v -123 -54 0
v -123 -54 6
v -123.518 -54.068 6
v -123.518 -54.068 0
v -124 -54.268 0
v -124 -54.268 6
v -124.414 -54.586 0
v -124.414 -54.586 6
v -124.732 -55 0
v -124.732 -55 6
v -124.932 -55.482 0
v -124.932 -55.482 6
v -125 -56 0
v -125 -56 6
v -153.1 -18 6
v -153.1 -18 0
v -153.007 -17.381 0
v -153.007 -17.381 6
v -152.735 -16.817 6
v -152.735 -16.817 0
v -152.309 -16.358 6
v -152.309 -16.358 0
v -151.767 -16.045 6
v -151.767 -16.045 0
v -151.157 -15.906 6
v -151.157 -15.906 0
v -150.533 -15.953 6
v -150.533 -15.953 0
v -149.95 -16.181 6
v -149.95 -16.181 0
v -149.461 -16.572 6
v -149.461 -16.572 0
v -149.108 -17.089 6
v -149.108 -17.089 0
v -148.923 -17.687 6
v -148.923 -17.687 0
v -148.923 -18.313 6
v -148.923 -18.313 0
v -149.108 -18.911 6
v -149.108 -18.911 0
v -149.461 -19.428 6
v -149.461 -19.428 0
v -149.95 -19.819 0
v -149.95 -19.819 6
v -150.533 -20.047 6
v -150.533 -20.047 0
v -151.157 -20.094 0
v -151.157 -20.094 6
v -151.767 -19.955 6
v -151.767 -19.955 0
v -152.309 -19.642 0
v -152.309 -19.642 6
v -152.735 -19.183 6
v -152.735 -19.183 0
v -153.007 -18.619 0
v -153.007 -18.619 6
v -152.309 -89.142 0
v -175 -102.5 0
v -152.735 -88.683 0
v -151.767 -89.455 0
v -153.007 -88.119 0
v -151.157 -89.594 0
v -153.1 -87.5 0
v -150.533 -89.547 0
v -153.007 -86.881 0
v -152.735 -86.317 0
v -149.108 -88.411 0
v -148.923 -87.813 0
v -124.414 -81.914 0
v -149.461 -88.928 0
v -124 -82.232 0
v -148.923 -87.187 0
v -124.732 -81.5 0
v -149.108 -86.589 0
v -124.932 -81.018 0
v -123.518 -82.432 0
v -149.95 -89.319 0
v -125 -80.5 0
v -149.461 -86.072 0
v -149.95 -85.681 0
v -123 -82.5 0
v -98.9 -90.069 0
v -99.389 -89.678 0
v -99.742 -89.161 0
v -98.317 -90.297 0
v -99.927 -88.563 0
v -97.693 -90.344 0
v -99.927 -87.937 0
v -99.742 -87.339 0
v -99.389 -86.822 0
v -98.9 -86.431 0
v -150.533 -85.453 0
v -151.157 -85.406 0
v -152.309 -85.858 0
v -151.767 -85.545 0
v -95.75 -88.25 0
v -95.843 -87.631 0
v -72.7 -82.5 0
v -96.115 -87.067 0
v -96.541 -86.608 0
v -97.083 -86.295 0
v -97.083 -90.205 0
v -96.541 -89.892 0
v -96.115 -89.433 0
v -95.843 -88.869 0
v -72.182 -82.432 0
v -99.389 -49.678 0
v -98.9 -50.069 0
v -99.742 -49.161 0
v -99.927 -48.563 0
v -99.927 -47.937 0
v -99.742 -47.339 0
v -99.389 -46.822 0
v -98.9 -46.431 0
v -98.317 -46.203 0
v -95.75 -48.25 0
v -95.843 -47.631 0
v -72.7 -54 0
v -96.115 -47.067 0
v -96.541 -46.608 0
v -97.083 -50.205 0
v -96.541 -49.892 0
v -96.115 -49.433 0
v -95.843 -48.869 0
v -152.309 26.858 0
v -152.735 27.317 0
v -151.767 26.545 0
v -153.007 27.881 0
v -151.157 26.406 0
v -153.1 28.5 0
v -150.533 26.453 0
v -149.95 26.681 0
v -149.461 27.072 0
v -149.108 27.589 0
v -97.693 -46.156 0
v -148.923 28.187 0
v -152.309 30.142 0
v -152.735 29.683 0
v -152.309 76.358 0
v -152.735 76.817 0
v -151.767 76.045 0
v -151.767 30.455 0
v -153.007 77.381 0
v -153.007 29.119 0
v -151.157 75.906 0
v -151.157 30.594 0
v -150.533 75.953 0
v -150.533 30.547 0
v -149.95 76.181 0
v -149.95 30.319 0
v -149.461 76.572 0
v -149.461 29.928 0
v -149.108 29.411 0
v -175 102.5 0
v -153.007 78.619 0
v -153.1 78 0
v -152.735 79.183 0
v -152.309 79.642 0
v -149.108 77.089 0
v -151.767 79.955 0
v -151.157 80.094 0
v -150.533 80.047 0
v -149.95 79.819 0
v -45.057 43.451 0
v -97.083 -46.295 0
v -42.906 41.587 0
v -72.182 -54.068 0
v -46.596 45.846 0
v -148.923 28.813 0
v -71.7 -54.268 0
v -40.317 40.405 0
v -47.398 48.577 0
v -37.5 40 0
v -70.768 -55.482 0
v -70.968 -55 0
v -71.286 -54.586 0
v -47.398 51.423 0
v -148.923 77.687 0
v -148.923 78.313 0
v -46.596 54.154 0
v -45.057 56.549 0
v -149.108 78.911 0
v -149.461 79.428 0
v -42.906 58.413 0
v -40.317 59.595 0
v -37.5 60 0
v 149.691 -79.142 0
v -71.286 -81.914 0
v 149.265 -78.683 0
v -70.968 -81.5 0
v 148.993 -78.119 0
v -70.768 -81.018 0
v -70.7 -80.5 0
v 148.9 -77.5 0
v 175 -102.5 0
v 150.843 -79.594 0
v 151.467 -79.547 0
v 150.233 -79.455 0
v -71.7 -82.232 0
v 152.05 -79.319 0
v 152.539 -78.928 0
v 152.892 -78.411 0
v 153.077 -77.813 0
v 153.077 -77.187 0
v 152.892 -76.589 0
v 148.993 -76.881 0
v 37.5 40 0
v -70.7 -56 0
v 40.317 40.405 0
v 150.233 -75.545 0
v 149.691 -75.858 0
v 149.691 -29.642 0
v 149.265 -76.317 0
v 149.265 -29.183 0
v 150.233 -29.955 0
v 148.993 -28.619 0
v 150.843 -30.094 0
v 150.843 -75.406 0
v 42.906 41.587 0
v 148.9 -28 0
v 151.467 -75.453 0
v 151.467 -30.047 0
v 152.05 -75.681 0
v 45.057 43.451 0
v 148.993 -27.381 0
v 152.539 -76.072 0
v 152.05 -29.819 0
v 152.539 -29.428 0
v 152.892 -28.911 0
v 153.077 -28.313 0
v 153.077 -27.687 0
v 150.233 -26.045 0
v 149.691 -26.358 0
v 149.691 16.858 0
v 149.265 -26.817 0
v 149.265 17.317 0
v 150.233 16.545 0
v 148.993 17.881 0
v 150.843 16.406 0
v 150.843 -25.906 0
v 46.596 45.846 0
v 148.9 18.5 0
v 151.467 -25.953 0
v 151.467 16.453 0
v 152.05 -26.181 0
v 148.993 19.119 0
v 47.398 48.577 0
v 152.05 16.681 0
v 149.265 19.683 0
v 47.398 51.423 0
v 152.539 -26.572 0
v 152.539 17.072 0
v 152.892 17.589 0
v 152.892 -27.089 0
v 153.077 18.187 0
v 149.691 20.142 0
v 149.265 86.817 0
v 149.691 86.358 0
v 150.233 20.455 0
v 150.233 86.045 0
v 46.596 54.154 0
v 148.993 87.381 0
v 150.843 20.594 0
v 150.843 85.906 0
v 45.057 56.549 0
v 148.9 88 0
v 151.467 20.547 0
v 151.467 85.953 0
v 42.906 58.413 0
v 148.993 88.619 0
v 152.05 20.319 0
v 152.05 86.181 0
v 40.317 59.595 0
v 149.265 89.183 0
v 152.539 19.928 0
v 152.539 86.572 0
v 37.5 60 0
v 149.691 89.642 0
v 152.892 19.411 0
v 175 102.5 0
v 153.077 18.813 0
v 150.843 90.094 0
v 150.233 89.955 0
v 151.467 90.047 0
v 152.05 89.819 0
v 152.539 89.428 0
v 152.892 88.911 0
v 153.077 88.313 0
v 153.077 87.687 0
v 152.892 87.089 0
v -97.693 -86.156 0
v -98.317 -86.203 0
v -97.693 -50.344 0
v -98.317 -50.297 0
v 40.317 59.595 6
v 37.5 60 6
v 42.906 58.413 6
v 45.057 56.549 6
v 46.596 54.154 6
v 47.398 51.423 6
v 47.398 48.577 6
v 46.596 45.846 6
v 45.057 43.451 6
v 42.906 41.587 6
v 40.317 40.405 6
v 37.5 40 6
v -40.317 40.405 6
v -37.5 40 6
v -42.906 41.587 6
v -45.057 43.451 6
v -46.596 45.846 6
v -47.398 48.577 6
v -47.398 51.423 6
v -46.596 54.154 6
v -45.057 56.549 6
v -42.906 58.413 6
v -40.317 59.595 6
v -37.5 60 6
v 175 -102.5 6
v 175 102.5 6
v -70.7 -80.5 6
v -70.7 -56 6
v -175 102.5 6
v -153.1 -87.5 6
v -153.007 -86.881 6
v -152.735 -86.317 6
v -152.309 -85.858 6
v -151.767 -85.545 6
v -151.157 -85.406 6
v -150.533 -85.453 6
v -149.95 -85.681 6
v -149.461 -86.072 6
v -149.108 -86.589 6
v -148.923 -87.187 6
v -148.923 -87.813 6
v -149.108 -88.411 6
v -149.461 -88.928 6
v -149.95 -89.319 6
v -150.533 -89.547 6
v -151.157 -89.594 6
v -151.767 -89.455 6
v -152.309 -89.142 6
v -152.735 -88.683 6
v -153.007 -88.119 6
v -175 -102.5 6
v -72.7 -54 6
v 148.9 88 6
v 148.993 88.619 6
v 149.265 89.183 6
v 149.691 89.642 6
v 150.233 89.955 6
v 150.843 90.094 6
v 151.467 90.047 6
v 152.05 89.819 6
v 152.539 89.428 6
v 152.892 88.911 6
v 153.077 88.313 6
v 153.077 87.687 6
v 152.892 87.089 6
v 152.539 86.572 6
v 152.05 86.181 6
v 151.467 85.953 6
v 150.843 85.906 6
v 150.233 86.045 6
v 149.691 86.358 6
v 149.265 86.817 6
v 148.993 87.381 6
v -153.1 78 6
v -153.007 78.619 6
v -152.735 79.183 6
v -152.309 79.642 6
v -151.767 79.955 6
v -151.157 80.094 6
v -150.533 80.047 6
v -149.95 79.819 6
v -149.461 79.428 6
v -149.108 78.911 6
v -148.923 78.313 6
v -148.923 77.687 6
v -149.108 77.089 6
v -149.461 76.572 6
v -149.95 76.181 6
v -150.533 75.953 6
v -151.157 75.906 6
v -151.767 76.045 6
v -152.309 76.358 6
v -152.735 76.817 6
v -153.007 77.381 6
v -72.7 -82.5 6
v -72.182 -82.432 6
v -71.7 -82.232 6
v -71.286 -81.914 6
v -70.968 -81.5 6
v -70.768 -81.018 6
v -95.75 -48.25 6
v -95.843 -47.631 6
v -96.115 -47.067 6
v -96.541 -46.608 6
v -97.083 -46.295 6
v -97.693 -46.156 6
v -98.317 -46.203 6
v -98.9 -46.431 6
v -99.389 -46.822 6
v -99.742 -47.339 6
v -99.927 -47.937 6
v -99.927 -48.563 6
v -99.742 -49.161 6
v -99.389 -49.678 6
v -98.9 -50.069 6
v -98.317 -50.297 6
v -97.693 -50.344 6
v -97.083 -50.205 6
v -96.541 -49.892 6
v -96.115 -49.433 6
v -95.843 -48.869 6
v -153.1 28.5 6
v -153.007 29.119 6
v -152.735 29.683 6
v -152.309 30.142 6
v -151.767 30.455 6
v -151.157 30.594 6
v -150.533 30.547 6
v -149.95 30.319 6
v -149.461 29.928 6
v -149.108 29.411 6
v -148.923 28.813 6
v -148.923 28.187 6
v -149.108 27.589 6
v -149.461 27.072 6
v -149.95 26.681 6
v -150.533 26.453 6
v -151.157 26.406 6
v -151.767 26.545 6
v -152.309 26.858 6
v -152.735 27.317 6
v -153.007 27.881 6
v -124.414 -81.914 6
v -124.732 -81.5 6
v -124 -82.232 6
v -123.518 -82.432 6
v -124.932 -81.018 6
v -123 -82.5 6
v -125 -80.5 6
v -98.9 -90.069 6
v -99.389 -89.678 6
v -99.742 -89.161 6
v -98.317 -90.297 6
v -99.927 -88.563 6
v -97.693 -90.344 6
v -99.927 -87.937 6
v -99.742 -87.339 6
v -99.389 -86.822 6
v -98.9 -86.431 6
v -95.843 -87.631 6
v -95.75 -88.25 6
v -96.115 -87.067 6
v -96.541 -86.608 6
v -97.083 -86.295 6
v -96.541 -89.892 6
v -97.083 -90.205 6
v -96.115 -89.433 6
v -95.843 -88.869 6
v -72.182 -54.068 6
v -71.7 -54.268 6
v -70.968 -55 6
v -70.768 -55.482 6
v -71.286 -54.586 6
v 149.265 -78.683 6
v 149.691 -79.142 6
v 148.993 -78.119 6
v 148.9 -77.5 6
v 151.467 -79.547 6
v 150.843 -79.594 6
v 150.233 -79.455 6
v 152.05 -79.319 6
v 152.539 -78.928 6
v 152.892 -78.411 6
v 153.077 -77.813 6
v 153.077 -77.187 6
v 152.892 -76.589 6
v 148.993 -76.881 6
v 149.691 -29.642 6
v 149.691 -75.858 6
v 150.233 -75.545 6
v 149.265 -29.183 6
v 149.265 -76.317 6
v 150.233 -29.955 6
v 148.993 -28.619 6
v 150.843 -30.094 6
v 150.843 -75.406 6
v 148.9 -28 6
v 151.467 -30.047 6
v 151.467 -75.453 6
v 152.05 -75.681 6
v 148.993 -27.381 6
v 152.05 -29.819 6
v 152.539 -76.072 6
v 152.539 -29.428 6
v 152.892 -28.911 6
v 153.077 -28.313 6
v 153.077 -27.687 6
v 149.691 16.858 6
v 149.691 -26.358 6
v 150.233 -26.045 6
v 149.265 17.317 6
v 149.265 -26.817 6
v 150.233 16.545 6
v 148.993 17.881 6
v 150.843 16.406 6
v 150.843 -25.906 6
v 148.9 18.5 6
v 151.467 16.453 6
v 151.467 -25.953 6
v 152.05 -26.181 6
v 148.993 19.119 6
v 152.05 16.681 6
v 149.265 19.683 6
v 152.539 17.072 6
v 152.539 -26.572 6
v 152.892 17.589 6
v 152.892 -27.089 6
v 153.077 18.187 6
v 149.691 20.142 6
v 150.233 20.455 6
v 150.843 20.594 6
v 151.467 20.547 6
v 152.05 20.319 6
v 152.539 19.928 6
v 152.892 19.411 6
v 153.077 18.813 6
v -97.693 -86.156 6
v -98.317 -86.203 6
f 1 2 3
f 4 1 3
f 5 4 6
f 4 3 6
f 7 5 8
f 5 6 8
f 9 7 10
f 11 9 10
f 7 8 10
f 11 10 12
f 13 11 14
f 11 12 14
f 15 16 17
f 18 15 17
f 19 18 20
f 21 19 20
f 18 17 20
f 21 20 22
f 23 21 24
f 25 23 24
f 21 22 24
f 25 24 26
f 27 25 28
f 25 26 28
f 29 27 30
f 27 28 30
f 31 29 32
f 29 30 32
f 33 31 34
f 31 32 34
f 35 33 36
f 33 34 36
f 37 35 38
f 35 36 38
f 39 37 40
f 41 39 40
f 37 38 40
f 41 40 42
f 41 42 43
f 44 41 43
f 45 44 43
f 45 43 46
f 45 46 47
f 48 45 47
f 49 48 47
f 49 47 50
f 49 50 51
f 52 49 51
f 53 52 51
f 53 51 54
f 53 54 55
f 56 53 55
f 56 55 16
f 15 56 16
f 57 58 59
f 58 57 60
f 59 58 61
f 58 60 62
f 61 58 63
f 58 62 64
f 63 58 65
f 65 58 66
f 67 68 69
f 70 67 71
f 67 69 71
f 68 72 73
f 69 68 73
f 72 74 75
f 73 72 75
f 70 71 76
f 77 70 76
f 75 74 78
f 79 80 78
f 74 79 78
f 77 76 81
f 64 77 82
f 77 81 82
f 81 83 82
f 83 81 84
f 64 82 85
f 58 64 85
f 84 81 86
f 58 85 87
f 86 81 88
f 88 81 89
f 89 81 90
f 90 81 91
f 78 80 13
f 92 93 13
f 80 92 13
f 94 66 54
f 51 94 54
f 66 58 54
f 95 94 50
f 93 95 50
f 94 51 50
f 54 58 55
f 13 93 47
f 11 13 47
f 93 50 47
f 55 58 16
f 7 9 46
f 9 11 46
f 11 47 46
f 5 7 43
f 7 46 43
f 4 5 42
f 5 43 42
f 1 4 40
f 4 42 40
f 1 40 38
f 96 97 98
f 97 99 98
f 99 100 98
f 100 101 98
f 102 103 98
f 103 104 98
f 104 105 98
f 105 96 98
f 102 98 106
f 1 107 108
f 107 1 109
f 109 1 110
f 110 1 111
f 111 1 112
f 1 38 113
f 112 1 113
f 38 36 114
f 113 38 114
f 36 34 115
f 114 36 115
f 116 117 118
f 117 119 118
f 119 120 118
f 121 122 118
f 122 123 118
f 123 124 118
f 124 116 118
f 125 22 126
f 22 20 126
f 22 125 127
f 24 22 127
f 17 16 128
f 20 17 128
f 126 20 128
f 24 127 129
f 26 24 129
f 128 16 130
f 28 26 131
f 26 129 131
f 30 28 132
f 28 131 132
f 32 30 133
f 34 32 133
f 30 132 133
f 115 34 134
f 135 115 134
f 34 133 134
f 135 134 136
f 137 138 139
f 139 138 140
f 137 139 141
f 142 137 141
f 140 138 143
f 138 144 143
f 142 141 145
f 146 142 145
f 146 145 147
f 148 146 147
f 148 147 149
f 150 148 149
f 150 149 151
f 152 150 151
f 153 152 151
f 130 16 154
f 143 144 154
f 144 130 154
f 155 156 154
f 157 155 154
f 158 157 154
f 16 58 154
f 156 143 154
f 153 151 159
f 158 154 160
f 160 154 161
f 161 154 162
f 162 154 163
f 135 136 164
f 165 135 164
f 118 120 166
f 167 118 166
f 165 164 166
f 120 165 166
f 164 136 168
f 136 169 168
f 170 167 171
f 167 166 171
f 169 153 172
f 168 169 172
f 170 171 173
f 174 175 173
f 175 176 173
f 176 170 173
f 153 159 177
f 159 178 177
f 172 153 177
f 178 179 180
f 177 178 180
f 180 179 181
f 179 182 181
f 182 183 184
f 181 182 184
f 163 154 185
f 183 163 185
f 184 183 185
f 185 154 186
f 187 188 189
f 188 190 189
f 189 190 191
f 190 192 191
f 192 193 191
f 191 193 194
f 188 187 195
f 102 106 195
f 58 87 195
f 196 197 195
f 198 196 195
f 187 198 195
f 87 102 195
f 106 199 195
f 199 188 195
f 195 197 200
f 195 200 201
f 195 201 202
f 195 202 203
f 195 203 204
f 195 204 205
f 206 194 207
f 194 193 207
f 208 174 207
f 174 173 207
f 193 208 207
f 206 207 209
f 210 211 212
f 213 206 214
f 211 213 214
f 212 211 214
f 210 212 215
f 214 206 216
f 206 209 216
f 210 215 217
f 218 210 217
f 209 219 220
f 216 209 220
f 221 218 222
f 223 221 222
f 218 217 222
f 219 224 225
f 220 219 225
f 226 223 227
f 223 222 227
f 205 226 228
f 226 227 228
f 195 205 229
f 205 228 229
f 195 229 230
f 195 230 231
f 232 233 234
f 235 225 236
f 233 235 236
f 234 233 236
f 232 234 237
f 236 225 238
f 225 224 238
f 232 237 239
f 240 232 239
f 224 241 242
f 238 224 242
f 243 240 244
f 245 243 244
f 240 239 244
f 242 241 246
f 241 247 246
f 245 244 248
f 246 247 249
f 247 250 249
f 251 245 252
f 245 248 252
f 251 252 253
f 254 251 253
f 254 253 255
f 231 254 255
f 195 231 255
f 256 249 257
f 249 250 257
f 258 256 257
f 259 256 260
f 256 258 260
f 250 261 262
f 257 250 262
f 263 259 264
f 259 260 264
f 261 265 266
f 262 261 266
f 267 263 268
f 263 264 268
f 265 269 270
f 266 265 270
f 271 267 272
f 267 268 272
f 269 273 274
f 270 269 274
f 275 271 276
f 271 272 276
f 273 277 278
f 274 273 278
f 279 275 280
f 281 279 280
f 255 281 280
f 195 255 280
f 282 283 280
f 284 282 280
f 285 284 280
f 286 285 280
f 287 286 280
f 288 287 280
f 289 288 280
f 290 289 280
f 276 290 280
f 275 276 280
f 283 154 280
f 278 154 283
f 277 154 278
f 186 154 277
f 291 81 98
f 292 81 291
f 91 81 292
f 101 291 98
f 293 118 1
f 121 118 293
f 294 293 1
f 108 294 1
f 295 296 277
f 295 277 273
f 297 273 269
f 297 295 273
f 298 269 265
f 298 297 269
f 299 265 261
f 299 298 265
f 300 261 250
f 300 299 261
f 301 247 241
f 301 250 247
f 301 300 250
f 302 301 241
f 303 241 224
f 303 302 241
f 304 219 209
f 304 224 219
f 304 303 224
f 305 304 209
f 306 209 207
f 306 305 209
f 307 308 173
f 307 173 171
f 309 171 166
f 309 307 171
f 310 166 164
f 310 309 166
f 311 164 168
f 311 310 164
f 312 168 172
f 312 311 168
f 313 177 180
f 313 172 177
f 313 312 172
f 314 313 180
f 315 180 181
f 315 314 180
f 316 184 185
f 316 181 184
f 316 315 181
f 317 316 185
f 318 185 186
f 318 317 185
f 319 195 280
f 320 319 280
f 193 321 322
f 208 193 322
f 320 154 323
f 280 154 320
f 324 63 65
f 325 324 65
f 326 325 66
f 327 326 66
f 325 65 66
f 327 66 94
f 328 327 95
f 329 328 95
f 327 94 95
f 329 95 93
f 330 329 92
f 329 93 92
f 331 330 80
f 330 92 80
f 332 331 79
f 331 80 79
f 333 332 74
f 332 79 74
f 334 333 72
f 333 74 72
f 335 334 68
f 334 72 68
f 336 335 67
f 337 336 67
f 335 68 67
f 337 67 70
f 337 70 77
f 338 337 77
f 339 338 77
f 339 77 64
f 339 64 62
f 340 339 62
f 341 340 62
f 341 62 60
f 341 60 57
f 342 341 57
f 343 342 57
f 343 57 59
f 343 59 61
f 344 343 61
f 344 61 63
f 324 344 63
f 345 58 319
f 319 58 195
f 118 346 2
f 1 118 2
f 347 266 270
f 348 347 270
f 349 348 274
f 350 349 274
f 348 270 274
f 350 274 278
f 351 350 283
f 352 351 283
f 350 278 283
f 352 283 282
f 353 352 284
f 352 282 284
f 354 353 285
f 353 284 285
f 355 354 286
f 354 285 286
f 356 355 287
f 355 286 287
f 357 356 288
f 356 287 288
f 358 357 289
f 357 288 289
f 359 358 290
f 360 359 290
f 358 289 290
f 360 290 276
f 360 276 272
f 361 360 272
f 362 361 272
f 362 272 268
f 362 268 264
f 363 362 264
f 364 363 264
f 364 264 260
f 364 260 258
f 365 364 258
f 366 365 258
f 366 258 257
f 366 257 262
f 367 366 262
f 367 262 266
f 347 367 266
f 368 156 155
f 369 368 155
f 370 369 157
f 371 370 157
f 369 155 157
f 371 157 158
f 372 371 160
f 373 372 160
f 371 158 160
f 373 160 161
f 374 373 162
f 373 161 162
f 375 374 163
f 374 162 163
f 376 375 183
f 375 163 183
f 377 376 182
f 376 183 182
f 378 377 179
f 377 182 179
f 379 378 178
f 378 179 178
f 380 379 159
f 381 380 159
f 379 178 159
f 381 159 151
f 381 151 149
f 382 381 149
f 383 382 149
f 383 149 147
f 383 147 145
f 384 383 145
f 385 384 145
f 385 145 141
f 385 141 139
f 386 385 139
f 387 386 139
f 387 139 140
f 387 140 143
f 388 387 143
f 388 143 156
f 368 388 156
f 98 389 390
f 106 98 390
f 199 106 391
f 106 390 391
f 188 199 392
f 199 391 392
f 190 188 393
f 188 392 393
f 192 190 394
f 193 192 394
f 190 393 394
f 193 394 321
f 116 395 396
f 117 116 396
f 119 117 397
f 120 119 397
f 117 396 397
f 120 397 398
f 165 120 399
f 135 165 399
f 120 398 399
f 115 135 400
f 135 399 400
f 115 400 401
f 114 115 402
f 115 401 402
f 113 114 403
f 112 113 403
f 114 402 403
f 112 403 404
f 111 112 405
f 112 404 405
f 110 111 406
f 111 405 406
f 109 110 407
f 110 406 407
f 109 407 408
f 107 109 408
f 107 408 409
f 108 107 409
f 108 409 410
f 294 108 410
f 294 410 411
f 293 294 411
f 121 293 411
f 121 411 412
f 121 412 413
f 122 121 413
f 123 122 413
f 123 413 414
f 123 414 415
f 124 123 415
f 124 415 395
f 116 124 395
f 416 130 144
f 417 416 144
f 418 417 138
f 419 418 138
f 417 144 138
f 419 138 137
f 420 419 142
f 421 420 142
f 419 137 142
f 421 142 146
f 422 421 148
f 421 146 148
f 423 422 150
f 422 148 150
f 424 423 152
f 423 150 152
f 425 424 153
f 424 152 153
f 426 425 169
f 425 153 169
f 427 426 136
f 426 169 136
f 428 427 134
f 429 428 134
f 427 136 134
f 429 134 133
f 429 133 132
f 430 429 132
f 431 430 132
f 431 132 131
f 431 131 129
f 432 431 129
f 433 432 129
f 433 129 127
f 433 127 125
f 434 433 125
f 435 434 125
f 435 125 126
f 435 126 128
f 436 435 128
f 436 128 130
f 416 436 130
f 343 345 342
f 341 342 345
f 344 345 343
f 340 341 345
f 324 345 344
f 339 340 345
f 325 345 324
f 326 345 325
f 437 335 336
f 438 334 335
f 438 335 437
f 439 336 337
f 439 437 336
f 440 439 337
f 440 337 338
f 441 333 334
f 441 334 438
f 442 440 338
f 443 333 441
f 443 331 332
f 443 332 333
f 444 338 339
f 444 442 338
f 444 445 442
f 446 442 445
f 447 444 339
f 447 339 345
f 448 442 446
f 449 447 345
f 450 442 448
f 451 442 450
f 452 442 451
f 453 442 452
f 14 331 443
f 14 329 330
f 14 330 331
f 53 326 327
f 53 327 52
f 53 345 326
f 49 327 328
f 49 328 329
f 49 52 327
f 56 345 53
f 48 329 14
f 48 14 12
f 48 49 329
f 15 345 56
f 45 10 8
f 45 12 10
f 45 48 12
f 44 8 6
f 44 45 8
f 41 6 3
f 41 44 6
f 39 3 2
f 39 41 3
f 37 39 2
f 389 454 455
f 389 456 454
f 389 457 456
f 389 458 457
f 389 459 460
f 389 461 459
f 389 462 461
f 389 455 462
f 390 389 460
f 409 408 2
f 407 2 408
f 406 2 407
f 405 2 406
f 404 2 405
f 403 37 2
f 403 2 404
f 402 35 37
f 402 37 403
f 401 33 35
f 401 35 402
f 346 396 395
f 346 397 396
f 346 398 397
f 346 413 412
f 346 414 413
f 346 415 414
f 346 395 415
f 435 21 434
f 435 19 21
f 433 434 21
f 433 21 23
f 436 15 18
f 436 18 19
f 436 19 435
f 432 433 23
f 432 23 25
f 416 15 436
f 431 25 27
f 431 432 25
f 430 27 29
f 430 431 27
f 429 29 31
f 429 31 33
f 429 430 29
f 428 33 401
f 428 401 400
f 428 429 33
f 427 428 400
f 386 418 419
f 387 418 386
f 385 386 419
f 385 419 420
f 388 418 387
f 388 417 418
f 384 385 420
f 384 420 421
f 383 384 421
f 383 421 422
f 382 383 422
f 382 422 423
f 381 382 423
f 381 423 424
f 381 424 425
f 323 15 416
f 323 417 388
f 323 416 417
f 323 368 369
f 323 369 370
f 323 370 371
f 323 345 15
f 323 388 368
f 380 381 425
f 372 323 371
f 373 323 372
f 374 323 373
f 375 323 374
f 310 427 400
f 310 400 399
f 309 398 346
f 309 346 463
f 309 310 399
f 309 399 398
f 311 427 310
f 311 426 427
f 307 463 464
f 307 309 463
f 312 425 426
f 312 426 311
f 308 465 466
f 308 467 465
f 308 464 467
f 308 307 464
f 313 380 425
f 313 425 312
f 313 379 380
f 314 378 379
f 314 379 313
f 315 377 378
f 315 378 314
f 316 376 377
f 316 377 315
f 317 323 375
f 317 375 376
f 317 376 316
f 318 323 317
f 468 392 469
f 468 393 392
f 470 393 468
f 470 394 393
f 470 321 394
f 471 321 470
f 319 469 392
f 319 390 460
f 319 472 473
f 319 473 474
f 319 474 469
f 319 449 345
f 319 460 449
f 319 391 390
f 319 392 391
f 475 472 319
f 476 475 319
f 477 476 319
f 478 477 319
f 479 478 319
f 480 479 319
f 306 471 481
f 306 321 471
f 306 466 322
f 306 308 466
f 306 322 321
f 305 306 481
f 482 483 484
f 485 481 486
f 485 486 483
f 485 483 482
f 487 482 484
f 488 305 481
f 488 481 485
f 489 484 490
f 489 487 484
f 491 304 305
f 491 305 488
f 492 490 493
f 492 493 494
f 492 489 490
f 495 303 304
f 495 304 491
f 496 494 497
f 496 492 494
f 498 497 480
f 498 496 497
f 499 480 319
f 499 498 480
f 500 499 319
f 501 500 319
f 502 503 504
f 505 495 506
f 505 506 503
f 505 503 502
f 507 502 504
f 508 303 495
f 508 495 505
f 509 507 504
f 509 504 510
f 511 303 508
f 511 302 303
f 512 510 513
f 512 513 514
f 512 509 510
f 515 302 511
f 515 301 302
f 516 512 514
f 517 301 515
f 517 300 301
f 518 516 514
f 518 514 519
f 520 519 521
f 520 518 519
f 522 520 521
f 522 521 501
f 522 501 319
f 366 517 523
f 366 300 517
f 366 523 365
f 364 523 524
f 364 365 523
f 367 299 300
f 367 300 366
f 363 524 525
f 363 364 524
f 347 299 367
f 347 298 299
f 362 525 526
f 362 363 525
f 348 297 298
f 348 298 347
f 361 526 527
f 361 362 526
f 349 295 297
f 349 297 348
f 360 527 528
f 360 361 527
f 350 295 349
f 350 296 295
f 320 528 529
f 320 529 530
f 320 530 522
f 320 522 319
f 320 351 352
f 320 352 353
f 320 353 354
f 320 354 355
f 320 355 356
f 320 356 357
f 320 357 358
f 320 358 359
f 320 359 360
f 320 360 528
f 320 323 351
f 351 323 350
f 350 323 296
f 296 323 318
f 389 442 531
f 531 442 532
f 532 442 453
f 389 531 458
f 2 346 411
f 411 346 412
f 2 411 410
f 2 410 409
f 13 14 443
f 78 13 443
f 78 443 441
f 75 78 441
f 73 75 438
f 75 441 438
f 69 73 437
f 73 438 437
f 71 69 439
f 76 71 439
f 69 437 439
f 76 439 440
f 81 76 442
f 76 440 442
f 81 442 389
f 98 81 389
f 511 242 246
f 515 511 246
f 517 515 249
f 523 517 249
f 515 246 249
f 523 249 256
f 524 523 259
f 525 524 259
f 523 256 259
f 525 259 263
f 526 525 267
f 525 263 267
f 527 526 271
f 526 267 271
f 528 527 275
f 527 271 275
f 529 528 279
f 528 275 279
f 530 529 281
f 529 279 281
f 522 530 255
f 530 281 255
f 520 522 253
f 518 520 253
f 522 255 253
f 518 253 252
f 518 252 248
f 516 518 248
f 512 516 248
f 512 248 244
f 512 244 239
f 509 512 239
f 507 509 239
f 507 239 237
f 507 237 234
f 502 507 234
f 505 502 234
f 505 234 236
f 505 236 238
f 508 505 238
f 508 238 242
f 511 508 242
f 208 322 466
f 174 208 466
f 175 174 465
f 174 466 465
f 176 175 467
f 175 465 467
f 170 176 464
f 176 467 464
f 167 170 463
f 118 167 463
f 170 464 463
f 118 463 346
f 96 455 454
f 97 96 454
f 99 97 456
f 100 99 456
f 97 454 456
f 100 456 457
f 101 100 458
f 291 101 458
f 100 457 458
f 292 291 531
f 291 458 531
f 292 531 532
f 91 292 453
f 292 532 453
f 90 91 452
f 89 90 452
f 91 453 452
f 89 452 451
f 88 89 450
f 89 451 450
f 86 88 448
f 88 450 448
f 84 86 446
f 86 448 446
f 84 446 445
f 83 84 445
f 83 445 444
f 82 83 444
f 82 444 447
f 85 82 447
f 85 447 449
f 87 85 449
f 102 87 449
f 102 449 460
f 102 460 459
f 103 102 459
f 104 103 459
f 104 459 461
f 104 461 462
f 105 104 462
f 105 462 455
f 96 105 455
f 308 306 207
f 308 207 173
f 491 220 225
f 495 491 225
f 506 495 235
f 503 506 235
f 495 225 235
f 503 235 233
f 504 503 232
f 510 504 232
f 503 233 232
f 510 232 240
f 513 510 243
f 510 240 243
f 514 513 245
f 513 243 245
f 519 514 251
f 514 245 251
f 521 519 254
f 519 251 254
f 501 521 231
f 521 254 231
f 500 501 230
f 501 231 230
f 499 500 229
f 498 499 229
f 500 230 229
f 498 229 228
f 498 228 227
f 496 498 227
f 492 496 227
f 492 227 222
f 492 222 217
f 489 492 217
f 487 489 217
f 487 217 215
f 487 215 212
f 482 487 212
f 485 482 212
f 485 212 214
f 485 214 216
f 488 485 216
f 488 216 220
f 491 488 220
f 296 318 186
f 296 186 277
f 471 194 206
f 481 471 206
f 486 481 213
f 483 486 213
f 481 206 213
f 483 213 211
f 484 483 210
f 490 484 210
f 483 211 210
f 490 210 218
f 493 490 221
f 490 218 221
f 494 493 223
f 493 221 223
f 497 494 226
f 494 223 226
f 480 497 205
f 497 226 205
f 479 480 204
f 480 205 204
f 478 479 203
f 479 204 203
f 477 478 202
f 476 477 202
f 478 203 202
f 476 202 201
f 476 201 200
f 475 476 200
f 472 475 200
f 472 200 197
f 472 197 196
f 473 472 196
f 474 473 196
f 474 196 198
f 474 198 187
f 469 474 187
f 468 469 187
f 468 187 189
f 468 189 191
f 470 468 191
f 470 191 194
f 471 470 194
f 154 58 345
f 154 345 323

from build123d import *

# Parameters (mm, degrees)
ESBO_O1_W                    = 350
ESBO_O1_H                    = 205
RESSALTO_EXTRUS_O1_DEPTH     = 6
CORTE_EXTRUS_O1_DEPTH        = 203.897141429
ESBO_O3_R                    = 2.1
CORTE_EXTRUS_O2_DEPTH        = 203.897141429
FURO_DE_DI_METRO_4_2_4_2_1_D = 4.2


with BuildPart() as part:
    # Esboço1 → Ressalto-extrusão1 (new body)
    with BuildSketch(Plane.XY):
        Rectangle(ESBO_O1_W, ESBO_O1_H)
    extrude(amount=RESSALTO_EXTRUS_O1_DEPTH)

    # Esboço2 → Corte-extrusão1 (cut, through all)
    with BuildSketch(Plane.XY.offset(6)):
        with BuildLine():
            Line((-37.5, 60), (37.5, 60))
            ThreePointArc((37.5, 60), (47.5, 50), (37.5, 40))
            Line((37.5, 40), (-37.5, 40))
            ThreePointArc((-37.5, 40), (-47.5, 50), (-37.5, 60))
        make_face()
    extrude(amount=-CORTE_EXTRUS_O1_DEPTH, mode=Mode.SUBTRACT)

    # Esboço3 → Corte-extrusão2 (cut, through all)
    with BuildSketch(Plane.XY.offset(6)):
        with Locations((-97.85, -48.25)):
            Circle(ESBO_O3_R)
        with Locations((-97.85, -88.25)):
            Circle(ESBO_O3_R)
        with BuildLine():
            Line((-123, -82.5), (-72.7, -82.5))
            ThreePointArc((-72.7, -82.5), (-71.285786438, -81.914213562), (-70.7, -80.5))
            Line((-70.7, -80.5), (-70.7, -56))
            ThreePointArc((-70.7, -56), (-71.285786438, -54.585786438), (-72.7, -54))
            Line((-72.7, -54), (-123, -54))
            ThreePointArc((-123, -54), (-124.414213562, -54.585786438), (-125, -56))
            Line((-125, -56), (-125, -80.5))
            ThreePointArc((-125, -80.5), (-124.414213562, -81.914213562), (-123, -82.5))
        make_face()
    extrude(amount=-CORTE_EXTRUS_O2_DEPTH, mode=Mode.SUBTRACT)

    # Furo de diâmetro Ø4.2 (4.2)1 (through all)
    with Locations(Plane.XY.offset(6)):
        with Locations((-151, -87.5), (-151, -18), (151, -28), (151, -77.5), (151, 88), (151, 18.5), (-151, 78), (-151, 28.5)):
            Hole(FURO_DE_DI_METRO_4_2_4_2_1_D / 2)


solid = part.part
